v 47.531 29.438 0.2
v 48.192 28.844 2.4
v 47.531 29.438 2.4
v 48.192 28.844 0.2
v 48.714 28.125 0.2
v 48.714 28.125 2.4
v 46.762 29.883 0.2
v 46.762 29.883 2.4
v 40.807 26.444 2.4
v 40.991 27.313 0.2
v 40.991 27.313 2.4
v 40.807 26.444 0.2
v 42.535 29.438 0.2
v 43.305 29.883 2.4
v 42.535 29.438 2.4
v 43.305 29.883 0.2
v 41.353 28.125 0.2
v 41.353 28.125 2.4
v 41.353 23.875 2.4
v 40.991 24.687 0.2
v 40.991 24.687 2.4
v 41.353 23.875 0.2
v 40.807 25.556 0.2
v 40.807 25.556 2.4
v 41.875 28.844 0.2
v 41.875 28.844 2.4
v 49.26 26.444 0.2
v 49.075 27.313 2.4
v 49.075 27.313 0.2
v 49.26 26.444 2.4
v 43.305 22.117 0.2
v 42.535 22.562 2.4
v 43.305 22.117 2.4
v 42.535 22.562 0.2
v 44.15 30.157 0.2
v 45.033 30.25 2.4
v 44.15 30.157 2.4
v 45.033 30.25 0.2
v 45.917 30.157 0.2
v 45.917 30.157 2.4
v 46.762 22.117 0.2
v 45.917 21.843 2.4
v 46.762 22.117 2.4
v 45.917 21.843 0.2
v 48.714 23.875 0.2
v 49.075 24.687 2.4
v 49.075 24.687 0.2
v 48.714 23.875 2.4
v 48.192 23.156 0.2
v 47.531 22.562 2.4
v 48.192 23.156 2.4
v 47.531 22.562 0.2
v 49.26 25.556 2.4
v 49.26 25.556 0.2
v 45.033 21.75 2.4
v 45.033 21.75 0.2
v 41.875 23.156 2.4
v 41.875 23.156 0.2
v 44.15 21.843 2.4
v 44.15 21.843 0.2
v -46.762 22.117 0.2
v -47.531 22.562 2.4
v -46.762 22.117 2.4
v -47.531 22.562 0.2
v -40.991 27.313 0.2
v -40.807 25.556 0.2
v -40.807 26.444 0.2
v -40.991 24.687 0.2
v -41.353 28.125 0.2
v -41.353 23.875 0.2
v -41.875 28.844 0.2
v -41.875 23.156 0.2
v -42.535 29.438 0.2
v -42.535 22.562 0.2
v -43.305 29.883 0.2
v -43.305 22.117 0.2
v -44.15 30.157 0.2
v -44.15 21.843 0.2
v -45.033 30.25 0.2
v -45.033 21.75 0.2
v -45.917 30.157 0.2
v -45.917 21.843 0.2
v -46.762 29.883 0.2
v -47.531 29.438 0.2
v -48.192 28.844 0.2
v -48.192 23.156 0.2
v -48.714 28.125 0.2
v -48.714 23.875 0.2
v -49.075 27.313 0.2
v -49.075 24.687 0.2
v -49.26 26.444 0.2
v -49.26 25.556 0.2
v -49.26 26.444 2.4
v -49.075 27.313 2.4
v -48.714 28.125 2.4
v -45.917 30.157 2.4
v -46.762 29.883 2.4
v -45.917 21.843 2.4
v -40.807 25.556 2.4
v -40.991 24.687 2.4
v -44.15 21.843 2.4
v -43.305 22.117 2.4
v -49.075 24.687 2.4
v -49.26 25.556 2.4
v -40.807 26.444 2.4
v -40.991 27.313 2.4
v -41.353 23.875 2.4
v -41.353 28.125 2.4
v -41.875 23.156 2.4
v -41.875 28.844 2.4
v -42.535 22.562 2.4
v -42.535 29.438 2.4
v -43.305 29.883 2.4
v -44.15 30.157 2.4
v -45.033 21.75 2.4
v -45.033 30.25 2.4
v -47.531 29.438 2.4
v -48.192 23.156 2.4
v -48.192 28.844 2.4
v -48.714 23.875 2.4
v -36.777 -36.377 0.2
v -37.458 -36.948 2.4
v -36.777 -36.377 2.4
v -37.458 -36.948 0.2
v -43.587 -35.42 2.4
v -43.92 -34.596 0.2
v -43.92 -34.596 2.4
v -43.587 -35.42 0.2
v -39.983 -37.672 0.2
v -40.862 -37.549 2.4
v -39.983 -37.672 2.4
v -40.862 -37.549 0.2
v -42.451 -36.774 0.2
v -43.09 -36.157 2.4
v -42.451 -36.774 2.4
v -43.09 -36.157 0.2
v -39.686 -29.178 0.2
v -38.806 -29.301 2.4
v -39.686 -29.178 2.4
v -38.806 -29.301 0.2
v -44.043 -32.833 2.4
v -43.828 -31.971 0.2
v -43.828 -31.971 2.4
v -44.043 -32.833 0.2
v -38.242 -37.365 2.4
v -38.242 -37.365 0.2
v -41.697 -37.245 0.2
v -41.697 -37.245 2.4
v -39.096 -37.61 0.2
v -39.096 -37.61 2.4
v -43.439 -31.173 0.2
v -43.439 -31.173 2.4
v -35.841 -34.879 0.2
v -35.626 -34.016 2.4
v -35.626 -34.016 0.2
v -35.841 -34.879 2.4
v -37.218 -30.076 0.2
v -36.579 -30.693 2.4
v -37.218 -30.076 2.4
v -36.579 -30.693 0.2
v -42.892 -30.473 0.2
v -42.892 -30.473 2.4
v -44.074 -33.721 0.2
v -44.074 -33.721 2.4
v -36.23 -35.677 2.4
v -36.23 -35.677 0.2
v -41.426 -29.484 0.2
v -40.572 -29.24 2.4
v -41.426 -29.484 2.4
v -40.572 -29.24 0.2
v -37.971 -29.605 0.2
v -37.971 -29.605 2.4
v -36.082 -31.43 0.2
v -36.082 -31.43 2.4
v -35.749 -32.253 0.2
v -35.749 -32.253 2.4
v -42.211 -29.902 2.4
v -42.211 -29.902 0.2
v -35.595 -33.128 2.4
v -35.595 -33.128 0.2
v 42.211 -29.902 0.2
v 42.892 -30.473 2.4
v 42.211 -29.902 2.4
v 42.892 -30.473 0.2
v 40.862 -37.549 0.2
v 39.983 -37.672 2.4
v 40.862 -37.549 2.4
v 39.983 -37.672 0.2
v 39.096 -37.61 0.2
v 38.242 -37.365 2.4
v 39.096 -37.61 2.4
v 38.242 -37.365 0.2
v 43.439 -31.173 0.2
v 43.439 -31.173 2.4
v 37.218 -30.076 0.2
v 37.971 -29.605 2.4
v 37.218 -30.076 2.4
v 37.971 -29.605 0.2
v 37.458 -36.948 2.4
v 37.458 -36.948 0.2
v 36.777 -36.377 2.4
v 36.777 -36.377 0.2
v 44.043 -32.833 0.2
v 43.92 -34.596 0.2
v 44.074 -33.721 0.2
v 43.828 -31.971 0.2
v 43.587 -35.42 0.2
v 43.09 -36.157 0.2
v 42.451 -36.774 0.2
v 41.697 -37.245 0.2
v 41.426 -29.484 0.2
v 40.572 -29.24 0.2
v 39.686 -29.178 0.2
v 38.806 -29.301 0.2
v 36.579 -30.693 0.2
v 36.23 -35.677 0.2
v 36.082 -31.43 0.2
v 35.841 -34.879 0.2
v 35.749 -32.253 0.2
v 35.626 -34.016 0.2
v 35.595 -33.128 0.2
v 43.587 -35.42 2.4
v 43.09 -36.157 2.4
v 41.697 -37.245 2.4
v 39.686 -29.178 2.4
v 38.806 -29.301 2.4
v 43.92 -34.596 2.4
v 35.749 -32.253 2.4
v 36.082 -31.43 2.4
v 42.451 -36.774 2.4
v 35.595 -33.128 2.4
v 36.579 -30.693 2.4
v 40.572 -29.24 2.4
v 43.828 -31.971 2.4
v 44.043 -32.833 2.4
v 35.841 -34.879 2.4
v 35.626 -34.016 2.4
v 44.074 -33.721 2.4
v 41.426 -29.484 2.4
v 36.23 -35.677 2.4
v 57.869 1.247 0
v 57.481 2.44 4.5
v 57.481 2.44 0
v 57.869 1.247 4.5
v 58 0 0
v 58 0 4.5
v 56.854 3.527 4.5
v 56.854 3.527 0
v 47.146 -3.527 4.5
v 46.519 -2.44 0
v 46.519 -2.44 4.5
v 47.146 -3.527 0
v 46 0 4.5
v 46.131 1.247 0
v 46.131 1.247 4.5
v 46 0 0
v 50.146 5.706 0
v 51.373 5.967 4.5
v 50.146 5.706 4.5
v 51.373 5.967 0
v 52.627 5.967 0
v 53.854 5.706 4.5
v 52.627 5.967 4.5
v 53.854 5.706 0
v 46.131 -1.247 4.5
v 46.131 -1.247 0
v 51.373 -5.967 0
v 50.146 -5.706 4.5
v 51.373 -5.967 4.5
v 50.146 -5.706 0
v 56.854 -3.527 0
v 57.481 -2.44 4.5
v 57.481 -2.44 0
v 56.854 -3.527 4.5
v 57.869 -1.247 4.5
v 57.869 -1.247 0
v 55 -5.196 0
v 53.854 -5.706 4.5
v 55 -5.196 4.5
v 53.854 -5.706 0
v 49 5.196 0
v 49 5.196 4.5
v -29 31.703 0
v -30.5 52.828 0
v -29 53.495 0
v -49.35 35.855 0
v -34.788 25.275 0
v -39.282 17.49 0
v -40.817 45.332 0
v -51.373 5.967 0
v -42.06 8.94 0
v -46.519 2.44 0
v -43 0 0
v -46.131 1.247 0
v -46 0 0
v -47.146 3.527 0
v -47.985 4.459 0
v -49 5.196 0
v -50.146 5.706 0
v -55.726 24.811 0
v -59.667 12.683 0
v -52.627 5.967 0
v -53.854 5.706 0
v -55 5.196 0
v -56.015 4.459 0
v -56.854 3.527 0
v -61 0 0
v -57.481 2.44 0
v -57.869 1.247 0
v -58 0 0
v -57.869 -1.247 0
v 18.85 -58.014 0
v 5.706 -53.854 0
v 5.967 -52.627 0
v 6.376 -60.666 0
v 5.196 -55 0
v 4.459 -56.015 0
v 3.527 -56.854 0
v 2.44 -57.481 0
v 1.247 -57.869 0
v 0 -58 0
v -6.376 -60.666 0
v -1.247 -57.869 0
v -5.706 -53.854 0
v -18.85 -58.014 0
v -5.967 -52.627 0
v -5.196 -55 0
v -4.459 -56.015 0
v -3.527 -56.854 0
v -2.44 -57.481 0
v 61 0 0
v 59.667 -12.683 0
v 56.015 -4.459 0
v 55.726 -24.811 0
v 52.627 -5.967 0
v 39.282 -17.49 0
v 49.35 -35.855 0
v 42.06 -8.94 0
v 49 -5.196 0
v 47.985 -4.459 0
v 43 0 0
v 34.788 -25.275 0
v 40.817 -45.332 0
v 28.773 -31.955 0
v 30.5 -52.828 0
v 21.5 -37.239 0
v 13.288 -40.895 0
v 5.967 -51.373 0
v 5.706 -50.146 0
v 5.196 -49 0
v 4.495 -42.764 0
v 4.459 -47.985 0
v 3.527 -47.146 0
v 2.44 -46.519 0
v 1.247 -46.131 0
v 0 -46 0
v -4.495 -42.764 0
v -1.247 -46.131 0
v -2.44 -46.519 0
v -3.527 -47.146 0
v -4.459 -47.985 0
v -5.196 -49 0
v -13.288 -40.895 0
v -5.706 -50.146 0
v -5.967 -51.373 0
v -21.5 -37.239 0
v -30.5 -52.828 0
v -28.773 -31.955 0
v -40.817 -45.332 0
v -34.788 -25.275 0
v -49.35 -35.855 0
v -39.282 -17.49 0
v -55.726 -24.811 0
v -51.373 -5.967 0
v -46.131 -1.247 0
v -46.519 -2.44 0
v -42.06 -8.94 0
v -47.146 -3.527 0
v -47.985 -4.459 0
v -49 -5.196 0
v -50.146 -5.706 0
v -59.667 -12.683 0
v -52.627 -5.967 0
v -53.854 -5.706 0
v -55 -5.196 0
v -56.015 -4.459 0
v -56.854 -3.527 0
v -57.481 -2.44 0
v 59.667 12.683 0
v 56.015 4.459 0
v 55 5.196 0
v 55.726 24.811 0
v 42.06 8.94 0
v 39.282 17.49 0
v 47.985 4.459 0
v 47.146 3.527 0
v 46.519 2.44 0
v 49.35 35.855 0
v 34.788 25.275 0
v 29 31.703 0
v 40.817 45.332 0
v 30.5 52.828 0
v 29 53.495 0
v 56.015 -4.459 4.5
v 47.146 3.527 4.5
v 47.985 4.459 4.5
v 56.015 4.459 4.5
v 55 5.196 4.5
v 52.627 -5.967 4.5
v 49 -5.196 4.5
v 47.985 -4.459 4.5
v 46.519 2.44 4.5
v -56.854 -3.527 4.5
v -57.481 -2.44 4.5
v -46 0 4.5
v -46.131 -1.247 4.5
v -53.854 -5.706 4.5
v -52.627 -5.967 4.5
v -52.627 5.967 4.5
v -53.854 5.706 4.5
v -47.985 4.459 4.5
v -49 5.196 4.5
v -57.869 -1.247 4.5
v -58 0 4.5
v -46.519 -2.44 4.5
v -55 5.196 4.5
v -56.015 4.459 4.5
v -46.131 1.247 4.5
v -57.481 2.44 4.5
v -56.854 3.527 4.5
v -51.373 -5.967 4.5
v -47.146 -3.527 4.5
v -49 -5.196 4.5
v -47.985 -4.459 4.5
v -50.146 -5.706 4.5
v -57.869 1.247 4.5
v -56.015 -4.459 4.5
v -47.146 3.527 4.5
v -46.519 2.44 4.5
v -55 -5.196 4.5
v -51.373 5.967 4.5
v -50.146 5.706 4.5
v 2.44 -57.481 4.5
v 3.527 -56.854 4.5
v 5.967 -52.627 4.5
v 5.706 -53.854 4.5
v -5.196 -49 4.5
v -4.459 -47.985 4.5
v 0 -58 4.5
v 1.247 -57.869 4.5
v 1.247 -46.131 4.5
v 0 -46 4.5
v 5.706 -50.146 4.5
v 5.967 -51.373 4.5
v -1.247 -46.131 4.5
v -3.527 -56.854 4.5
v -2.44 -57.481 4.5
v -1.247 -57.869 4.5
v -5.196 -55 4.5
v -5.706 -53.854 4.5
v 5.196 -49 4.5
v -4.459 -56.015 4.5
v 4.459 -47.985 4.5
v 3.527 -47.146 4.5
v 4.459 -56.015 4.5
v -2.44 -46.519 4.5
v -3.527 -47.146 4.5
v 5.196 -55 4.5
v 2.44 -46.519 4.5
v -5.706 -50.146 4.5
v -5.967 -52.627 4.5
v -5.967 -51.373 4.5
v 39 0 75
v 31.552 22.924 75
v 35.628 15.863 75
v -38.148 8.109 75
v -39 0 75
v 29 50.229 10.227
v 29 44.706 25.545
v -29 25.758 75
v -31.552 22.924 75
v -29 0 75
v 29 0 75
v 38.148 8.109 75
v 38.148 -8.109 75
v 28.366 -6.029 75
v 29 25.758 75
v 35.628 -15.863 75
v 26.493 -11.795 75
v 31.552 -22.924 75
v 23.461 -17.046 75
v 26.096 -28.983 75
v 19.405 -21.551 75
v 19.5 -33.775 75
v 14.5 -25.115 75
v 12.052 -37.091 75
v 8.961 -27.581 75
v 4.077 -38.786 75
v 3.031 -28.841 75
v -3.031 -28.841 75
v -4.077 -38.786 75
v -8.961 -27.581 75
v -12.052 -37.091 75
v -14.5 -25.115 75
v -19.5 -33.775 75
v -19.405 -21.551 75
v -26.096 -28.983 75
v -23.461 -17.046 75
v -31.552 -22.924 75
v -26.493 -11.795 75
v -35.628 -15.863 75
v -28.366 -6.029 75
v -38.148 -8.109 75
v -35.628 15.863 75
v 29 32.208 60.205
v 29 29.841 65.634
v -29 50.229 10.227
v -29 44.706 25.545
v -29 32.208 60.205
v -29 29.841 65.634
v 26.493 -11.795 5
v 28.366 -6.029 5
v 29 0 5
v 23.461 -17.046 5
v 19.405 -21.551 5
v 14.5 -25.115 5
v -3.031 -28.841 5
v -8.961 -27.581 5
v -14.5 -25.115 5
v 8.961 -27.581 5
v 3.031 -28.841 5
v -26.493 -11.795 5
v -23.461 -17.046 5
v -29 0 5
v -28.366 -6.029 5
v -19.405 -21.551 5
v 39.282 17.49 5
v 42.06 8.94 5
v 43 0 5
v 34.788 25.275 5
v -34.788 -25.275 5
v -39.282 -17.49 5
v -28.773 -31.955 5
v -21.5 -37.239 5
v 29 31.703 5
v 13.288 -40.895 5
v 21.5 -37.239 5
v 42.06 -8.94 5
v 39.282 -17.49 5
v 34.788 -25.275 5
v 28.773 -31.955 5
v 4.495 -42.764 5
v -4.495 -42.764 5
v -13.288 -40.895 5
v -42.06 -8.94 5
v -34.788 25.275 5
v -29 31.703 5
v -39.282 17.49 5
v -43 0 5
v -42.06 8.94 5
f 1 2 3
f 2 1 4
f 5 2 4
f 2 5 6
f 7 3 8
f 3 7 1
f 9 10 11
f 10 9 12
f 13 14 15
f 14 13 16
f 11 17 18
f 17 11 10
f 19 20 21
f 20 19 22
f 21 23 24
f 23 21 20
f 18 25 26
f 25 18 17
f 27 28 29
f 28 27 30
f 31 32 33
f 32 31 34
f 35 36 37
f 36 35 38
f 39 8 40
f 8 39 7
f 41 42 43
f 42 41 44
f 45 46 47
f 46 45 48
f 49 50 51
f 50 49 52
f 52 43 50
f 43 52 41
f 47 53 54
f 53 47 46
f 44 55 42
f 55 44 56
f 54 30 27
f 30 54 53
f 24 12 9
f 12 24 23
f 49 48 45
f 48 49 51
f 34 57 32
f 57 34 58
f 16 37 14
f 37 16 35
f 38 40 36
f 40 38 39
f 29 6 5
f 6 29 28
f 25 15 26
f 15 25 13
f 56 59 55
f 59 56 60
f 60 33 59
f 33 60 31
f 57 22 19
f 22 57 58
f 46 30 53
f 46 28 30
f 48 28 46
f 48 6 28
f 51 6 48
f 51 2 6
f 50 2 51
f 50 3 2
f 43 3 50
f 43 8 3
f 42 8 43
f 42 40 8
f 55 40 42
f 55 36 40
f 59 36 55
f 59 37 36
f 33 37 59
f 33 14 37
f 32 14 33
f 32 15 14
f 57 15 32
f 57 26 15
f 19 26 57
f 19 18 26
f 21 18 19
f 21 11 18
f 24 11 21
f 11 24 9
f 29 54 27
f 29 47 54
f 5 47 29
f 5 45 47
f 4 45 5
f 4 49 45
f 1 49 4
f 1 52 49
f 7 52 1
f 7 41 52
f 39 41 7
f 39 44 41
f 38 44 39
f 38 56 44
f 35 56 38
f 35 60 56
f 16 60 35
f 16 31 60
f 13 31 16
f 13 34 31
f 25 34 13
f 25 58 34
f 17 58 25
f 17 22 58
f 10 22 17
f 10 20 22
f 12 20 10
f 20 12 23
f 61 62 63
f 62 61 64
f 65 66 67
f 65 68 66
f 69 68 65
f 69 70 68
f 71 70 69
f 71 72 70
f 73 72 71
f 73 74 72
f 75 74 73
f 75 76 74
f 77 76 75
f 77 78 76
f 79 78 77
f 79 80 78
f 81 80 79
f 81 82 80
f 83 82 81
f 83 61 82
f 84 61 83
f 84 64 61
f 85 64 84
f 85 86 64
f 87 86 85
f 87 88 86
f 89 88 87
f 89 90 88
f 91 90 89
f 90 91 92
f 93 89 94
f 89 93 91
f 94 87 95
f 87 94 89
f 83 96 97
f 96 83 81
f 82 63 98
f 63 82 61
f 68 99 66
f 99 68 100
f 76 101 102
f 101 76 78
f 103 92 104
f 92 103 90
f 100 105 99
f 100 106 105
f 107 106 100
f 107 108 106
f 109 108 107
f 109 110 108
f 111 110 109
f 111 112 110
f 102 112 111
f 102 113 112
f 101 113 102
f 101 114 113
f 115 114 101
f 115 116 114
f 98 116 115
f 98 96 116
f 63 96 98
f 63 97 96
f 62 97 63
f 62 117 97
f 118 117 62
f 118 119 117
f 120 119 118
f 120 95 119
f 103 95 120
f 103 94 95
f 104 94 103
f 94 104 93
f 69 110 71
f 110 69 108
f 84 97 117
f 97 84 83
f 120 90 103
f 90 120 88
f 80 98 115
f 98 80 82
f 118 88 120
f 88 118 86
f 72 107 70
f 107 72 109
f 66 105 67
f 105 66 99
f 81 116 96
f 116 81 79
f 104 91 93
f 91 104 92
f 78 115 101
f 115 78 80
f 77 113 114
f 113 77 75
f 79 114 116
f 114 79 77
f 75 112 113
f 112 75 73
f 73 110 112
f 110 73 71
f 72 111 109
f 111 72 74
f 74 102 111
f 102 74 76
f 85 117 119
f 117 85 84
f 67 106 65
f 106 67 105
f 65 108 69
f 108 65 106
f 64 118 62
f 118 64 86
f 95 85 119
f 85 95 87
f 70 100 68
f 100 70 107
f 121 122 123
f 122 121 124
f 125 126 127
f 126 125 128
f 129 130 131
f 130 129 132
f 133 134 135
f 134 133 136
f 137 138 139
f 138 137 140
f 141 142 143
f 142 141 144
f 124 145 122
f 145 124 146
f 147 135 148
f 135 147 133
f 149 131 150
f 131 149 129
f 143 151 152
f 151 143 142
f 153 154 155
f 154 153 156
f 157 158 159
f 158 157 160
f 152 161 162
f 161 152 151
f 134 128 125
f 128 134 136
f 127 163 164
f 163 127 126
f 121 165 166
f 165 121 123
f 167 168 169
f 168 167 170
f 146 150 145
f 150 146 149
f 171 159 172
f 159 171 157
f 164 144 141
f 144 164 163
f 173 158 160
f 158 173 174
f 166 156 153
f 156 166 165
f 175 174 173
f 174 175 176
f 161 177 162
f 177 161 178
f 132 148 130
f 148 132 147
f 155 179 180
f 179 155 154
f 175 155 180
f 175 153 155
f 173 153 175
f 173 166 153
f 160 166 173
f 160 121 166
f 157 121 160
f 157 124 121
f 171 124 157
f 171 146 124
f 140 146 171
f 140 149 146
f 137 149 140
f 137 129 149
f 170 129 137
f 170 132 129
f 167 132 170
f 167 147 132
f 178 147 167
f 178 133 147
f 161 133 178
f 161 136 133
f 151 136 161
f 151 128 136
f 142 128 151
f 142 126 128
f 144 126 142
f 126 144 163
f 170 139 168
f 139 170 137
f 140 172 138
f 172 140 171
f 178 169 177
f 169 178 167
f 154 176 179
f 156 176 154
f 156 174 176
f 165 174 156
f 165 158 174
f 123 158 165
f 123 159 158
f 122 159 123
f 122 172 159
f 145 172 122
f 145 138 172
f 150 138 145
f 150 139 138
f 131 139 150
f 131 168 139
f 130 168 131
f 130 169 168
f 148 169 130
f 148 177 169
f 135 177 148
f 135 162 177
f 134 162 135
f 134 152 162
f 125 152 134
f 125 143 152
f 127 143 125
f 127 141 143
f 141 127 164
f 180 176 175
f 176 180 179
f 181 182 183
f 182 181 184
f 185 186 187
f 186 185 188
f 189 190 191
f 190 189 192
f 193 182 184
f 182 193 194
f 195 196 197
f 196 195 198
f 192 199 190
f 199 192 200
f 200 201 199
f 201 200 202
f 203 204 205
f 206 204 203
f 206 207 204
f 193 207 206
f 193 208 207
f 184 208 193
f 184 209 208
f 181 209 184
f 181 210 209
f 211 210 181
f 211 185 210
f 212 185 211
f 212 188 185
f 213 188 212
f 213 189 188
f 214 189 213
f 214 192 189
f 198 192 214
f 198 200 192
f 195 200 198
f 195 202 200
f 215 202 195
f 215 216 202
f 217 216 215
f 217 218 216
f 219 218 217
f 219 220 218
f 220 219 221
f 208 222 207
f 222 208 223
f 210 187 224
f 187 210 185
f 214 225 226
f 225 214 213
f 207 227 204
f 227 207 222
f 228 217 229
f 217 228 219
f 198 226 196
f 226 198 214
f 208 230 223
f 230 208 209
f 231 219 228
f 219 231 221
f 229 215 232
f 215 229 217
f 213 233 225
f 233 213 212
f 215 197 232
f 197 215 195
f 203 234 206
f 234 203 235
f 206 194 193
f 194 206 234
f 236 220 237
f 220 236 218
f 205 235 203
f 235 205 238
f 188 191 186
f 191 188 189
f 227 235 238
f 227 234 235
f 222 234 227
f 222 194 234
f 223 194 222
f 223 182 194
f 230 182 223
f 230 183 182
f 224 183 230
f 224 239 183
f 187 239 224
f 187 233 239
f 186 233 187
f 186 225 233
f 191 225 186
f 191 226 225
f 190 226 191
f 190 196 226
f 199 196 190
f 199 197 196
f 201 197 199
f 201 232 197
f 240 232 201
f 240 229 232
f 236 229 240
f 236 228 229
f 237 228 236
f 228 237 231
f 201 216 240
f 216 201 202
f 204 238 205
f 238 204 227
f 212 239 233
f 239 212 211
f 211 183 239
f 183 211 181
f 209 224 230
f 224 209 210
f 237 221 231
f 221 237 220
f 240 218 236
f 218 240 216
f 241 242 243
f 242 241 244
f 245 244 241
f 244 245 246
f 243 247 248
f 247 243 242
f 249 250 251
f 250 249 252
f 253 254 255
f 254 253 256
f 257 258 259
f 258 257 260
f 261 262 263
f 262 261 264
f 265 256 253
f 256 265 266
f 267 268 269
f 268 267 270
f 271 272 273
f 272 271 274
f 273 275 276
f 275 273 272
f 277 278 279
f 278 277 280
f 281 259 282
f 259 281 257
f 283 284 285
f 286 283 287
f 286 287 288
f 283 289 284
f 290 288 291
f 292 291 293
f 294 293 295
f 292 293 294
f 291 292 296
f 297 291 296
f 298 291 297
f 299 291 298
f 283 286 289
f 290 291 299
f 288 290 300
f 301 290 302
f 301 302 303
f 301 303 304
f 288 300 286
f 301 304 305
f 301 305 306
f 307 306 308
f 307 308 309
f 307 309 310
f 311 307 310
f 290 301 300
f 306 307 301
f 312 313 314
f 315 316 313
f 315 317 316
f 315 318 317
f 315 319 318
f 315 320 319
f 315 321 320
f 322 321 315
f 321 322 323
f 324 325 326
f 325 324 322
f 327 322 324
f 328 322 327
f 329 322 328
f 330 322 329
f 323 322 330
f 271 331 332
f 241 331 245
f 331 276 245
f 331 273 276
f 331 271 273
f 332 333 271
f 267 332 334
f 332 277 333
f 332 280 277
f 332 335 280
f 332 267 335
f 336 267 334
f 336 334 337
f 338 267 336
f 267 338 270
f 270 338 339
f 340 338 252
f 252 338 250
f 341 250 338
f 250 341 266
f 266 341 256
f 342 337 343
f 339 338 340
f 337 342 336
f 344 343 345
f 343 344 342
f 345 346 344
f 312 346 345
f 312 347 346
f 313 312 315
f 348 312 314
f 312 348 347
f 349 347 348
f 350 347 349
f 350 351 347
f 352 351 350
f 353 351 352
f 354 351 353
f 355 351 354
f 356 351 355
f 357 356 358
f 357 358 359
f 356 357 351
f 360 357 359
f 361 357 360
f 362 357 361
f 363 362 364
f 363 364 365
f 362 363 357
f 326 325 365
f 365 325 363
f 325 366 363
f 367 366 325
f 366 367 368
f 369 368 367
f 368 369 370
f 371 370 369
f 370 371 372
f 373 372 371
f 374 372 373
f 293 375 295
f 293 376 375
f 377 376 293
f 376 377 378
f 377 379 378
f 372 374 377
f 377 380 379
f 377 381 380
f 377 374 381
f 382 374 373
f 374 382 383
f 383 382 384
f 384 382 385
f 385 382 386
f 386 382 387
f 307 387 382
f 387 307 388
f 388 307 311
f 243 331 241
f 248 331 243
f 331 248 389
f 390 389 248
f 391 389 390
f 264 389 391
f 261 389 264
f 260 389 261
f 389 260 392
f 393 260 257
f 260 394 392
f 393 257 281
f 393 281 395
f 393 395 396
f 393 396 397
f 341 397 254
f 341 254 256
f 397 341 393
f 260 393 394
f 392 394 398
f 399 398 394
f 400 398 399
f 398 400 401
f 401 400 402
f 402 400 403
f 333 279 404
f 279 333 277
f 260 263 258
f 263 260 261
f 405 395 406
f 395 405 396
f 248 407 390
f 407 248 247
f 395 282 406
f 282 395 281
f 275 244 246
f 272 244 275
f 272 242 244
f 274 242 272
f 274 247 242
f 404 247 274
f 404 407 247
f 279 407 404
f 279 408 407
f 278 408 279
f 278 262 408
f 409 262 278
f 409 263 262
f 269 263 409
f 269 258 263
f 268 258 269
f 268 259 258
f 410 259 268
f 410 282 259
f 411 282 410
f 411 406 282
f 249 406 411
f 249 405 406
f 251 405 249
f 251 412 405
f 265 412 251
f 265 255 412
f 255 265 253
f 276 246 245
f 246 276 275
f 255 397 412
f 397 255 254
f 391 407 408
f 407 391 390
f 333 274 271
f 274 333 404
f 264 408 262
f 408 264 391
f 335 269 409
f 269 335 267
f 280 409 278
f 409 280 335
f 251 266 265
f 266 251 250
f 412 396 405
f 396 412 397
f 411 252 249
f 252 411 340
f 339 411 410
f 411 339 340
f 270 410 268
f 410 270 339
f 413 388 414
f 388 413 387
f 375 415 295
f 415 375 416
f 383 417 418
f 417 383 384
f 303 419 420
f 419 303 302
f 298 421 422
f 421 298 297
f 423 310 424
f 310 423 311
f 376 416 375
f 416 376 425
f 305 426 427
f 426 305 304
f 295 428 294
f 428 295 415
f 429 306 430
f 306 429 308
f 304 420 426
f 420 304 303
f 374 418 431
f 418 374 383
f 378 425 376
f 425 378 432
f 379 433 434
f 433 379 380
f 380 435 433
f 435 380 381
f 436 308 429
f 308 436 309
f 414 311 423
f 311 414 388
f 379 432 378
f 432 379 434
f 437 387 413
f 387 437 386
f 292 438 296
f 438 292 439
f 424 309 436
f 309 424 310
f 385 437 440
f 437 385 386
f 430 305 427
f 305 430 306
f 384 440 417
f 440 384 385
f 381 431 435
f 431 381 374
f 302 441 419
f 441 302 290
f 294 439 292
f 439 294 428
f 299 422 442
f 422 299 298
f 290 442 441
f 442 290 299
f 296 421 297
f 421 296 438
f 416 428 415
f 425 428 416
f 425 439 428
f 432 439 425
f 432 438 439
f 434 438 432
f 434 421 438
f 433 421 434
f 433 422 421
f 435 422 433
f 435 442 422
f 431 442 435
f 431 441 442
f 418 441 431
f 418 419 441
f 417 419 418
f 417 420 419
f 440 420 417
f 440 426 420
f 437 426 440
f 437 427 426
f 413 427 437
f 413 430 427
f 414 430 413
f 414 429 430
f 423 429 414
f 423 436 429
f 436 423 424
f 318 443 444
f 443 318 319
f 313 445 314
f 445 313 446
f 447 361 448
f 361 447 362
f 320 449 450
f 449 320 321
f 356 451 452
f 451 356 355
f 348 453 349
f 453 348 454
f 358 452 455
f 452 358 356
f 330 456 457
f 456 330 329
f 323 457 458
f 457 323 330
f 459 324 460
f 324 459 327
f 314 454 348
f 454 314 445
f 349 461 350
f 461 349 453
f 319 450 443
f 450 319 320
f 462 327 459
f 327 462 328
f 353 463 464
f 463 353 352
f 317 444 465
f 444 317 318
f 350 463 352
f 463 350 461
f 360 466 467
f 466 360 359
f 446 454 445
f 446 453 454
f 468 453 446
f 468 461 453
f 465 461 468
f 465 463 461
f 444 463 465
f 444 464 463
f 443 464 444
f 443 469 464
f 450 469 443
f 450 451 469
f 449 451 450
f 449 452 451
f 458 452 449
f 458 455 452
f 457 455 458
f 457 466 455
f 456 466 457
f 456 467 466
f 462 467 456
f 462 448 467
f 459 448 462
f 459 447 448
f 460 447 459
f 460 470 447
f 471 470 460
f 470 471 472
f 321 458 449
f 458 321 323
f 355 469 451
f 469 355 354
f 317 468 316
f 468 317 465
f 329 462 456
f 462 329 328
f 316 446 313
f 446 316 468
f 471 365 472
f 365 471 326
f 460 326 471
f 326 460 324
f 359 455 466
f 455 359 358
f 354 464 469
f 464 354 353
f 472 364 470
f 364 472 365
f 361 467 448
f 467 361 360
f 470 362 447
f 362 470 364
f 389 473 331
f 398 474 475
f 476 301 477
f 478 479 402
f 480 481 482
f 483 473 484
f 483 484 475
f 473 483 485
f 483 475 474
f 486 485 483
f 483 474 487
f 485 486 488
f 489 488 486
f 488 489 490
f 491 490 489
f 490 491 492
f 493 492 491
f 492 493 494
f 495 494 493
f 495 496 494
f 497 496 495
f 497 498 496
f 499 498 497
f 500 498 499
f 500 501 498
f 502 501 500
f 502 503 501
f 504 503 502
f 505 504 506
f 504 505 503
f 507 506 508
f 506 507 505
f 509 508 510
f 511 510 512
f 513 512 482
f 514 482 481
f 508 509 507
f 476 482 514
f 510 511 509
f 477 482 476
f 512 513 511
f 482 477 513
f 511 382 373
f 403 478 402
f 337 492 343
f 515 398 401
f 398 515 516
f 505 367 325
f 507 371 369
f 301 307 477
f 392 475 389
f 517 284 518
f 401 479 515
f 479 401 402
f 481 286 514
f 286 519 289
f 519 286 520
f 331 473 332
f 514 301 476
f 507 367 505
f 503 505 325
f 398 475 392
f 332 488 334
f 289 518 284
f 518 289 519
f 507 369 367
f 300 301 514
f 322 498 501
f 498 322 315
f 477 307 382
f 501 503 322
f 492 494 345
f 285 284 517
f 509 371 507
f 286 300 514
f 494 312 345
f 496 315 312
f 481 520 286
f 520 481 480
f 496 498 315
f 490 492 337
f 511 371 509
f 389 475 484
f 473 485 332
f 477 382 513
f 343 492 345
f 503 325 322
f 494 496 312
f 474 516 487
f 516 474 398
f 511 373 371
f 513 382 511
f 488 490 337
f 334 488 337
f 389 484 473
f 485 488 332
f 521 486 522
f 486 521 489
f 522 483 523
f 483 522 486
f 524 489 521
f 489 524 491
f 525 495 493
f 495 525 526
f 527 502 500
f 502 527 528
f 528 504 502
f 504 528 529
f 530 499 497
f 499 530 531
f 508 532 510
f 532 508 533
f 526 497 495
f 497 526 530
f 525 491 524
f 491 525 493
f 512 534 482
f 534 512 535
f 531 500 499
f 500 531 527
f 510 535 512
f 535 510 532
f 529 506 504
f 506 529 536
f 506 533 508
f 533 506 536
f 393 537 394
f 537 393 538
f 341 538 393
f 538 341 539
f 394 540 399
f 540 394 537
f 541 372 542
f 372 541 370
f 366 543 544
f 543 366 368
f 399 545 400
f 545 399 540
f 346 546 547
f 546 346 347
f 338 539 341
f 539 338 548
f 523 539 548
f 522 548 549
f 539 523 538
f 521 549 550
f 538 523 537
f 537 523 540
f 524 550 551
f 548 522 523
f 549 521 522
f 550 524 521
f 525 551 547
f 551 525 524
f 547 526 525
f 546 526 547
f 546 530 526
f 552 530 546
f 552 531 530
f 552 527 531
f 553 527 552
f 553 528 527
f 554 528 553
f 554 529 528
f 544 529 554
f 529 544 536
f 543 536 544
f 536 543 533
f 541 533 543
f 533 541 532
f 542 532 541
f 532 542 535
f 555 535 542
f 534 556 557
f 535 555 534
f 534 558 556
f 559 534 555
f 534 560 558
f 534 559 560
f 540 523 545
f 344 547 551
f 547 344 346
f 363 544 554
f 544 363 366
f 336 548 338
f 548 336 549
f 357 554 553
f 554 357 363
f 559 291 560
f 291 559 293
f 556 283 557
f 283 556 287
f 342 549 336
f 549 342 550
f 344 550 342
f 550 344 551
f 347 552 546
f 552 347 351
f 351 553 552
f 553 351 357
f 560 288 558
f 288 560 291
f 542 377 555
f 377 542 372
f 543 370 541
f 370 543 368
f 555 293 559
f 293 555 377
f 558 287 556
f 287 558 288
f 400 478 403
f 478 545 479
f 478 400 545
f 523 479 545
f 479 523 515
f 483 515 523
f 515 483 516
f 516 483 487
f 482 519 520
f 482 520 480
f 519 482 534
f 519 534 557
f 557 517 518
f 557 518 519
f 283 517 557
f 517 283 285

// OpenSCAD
//aeropress stand - wide free-floating base vs fletcher design
rough_render = 30;
smooooth_render = 360;
$fn = rough_render; //resolution of curves


//
// physical things
//
//aeropress
plunger_tube_diameter = 58; //measured 56.5mm. same travel size and regular.
//plunger_lip_diameter = 74; //measured 70.9mm for the travel size. huh thats a thing.
plunger_lip_diameter = 86; //measured 83.65mm
//plunger_lip_height = 4.5; //measured 3.6mm for travel size.
plunger_lip_height = 5; //did not measure normal size, just bumped up to 5mm and that was a good fit.
plunger_nominal_height = 100; //not measured, just tall enough to subtract from everything

//magnets
magnet_diam = 8.5; //measured 7.9mm
magnet_height = 2.2; //measured 1.94mm - add .4 as two layers of gap

//grippy dome feet
grippy_diam = 12; //measured 11.04mm
grippy_height = 4.5; //measured at 5.25mm

//notes
//4mm grippy height looked too shallow
//9mm magnet diam has a bit of rattle room
//8mm magnet diam was too small, but not the best test as the print stopped a layer too late.
//2.4mm magner height was good but im going to try to squeeze another .2 out of it
//2mm wall thickness around grippy got down to just 1 wall at the top of the grippy inset void. bah changed to 3mm

//
// model things
//
wall_thickness_around_magnets = 2;
wall_thickness_around_grippy = 3;
thickness_under_magnets = 0.2; //adjust to be one layer
cone_top_wall_width = 10;
//cone_bottom_wall_width = 10; 
//cone_bottom_wall_width = magnet_diam + wall_thickness_around_magnets*2; 
cone_bottom_wall_width = grippy_diam + wall_thickness_around_grippy*2; 
cone_height = 75; //just making this up, 3"

d20_height = 129.17; //FYI 129.17 is exactly right to make a nice clean point where faces meet at top of dice and the void for pluger to slide into

//
//make holder
//

difference(){
    //
    //make holder around plunger
    //
  
    //normal cone shape, I like to render final object at $fn=180 or above for smooth surface  
    cylinder(cone_height,plunger_lip_diameter/2+cone_bottom_wall_width,plunger_tube_diameter/2+cone_top_wall_width);
    
    //or comment out above and do $fn=4 to make a pyramid. or fn=3,5,8 etc to make other shapes
//    cylinder(cone_height,plunger_lip_diameter/2+cone_bottom_wall_width+25,plunger_tube_diameter/2+cone_top_wall_width+3, $fn=4); //pyramid

    //
    //start subtracting/differencing things
    //
    
    //make plunger model to subtract from things
    cylinder(plunger_nominal_height, plunger_tube_diameter/2, plunger_tube_diameter/2);
    //make plunger lip
    cylinder(plunger_lip_height, plunger_lip_diameter/2, plunger_lip_diameter/2);
    
    //then square off the tubes so we have the path of object going into the holder
    //square of plunger tube
    translate([-plunger_tube_diameter/2,0,-0.1]){
        cube([plunger_tube_diameter,plunger_tube_diameter*2,plunger_nominal_height]);
    }
    
//    //square off plunger lip. or don't! then there is a slight catch in the forward direction after you put this item down
//    translate([-plunger_lip_diameter/2,0,0]){
//        cube([plunger_lip_diameter,plunger_lip_diameter,plunger_lip_height]);
//    }
    
    //remove magnet voids (internal to model)
    for (i = [30,150,220,320]){
        rotate([0,0,i]){
            translate([plunger_lip_diameter/2+cone_bottom_wall_width/2,0,thickness_under_magnets]){
                cylinder(magnet_height, magnet_diam/2, magnet_diam/2);
            }
        }
    }
    
    //remove grippy feet insets (visible insets to place grippys in)
    for (i = [0,180,270]){
        rotate([0,0,i]){
            translate([plunger_lip_diameter/2+cone_bottom_wall_width/2,0,0]){
                cylinder(grippy_height, grippy_diam/2, grippy_diam/2);
            }
        }
    }

} //end difference

module box(size) {
    cube([2*size, 2*size, size], center = true); 
}

module dodecahedron(size) {
      dihedral = 116.565;
      intersection(){
            box(size);
            intersection_for(i=[1:5])  { 
                rotate([dihedral, 0, 360 / 5 * i])  box(size); 
           }
      }
}
